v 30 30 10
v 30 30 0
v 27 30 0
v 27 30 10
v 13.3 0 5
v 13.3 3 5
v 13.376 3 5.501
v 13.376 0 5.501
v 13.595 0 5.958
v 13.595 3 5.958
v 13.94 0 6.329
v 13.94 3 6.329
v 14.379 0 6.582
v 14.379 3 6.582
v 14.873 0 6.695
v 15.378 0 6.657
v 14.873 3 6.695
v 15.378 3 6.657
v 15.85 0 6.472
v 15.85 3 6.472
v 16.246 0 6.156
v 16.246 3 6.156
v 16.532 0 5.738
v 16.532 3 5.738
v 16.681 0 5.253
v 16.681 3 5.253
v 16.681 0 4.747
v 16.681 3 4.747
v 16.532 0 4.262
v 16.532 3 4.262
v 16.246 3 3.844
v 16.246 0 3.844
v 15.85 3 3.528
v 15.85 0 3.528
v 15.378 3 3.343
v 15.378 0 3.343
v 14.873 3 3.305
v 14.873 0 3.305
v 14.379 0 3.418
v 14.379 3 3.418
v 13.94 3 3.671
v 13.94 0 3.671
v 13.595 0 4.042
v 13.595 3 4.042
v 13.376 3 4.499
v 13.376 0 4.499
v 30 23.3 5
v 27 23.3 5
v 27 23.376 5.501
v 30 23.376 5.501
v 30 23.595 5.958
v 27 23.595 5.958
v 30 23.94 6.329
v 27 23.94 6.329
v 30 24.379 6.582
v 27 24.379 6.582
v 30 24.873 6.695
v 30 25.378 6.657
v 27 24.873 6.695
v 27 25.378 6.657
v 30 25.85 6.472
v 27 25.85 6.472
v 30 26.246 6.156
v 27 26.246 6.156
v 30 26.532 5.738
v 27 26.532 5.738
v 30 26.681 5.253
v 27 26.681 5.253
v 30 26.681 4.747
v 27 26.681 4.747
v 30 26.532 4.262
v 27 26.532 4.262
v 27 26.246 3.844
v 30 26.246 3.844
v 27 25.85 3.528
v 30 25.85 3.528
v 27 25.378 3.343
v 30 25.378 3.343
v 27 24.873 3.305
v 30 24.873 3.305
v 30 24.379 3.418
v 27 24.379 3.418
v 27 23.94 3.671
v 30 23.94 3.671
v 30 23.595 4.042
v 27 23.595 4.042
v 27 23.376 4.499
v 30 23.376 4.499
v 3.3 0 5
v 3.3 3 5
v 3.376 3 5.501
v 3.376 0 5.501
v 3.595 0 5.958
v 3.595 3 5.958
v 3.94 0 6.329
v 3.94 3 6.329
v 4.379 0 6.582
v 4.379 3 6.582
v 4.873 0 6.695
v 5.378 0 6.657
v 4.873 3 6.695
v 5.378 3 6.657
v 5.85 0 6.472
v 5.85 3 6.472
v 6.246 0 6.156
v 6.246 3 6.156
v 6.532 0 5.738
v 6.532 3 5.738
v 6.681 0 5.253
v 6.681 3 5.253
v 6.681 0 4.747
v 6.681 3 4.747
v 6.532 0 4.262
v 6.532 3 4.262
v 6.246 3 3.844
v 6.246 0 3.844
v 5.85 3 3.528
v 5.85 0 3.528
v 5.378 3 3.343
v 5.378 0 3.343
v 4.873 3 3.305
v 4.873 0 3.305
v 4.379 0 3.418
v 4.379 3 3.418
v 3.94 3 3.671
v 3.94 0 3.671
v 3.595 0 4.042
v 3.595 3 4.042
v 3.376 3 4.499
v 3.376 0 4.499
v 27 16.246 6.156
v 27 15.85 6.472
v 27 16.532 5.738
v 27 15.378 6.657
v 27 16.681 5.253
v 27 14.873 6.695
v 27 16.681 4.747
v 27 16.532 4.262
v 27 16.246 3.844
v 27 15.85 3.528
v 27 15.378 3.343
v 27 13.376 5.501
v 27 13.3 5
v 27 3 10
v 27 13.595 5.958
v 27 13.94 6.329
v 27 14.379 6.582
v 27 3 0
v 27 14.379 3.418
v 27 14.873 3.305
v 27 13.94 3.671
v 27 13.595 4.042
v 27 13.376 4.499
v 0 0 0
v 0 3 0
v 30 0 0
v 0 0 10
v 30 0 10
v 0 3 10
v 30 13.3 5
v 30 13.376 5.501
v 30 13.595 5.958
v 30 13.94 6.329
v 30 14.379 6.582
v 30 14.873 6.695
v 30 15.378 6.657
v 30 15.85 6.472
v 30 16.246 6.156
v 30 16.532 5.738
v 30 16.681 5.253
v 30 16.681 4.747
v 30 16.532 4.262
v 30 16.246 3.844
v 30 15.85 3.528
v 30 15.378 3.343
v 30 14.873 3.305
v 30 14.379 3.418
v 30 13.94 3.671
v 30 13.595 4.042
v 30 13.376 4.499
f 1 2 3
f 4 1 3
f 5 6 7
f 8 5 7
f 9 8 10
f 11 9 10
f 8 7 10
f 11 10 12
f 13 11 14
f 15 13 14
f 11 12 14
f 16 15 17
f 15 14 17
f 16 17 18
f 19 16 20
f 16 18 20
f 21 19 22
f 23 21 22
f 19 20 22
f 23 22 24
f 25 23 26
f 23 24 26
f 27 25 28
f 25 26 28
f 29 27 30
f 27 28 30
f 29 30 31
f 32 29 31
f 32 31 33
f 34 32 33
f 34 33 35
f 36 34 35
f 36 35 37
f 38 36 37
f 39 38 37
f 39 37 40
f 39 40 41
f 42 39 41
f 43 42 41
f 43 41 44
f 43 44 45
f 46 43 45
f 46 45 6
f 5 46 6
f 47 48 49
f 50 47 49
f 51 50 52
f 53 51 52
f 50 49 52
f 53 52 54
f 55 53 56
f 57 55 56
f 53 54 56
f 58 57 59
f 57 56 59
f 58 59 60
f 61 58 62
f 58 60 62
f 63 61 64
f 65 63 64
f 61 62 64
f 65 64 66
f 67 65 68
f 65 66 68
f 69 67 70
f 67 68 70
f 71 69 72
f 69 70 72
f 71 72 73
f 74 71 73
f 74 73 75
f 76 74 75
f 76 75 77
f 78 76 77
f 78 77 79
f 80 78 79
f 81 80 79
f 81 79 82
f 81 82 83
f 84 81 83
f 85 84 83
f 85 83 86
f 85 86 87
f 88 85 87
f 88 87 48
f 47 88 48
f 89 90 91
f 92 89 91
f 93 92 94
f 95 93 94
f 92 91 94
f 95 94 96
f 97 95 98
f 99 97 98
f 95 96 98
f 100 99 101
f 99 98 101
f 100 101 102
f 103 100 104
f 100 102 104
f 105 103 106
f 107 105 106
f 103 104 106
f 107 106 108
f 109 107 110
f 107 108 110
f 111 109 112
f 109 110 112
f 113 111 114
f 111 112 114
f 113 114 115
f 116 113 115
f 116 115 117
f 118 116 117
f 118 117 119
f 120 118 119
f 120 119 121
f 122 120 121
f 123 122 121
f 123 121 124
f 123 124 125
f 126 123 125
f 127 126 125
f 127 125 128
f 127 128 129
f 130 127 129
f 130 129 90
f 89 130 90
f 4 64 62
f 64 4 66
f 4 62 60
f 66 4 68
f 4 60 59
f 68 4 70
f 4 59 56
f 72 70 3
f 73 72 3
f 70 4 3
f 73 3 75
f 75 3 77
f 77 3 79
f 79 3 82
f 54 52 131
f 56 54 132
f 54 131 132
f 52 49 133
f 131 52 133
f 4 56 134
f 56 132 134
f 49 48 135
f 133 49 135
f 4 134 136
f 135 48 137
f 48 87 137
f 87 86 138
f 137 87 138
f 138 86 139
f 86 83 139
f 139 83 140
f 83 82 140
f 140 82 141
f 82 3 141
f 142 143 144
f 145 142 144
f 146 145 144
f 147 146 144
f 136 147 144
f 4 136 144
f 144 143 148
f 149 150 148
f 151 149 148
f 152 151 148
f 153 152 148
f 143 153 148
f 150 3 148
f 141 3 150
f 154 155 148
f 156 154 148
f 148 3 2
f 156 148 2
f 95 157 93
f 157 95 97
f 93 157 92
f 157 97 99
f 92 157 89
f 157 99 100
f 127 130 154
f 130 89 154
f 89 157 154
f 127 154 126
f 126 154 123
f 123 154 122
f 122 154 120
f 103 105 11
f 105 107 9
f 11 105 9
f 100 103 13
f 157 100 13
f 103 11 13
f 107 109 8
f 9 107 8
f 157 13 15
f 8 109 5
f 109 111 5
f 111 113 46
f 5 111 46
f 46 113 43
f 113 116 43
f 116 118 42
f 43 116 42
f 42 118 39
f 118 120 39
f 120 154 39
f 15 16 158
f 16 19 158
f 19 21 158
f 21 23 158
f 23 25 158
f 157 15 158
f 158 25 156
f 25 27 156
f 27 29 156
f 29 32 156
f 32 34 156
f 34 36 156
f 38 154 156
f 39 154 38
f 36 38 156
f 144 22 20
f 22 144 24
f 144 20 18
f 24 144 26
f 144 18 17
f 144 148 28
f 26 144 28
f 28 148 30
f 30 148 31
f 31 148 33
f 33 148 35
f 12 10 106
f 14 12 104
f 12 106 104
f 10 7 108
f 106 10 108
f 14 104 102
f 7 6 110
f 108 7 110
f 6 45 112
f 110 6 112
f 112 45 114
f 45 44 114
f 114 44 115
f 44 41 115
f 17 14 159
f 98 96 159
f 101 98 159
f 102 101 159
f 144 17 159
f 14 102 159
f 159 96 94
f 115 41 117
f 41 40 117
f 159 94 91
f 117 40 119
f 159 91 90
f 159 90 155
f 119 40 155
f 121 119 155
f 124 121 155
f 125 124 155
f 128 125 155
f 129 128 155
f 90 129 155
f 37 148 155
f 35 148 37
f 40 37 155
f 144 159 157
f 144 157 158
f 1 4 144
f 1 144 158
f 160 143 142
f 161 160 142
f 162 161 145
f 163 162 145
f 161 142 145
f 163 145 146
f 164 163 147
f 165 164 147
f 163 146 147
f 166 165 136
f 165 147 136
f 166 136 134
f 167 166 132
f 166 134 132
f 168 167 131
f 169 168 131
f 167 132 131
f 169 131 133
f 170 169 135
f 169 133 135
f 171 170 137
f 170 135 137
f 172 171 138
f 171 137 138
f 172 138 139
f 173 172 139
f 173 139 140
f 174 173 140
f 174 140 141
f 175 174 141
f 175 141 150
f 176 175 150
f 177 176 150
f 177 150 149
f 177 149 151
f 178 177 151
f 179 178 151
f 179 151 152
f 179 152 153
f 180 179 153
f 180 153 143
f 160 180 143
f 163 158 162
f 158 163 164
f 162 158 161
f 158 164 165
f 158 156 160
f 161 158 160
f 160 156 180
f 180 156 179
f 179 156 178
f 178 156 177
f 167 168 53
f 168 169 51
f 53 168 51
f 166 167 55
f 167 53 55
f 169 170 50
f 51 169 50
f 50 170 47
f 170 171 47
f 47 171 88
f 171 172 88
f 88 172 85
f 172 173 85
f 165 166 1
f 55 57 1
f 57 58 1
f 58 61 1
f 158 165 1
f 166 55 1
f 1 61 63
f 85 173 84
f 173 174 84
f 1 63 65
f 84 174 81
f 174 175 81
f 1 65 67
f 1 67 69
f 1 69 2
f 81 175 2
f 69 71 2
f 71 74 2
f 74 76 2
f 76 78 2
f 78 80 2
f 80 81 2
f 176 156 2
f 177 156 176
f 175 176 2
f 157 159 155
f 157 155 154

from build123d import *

# Parameters (mm, degrees)
F1_DEPTH = 10
F3_R     = 1.7
F4_DEPTH = 25
F2_R     = 1.7
F5_DEPTH = 25


with BuildPart() as f1:
    # F0 (on Top) → F1 (new body)
    with BuildSketch(Plane.XY):
        Polygon((0, 3), (0, 0), (30, 0), (30, 30), (27, 30), (27, 3), align=None)
    extrude(amount=F1_DEPTH)

    # F3 (on face) → F4 (cut)
    with BuildSketch(Plane(origin=(27, 0, 0), x_dir=(0, -1, 0), z_dir=(-1, 0, 0))):
        with Locations((-25, 5)):
            Circle(F3_R)
        with Locations((-15, 5)):
            Circle(F3_R)
    extrude(amount=-F4_DEPTH, mode=Mode.SUBTRACT)

    # F2 (on face) → F5 (cut)
    with BuildSketch(Plane(origin=(0, 3, 0), x_dir=(-1, 0, 0), z_dir=(0, 1, 0))):
        with Locations((-15, 5)):
            Circle(F2_R)
        with Locations((-5, 5)):
            Circle(F2_R)
    extrude(amount=-F5_DEPTH, mode=Mode.SUBTRACT)


solid = f1.part
